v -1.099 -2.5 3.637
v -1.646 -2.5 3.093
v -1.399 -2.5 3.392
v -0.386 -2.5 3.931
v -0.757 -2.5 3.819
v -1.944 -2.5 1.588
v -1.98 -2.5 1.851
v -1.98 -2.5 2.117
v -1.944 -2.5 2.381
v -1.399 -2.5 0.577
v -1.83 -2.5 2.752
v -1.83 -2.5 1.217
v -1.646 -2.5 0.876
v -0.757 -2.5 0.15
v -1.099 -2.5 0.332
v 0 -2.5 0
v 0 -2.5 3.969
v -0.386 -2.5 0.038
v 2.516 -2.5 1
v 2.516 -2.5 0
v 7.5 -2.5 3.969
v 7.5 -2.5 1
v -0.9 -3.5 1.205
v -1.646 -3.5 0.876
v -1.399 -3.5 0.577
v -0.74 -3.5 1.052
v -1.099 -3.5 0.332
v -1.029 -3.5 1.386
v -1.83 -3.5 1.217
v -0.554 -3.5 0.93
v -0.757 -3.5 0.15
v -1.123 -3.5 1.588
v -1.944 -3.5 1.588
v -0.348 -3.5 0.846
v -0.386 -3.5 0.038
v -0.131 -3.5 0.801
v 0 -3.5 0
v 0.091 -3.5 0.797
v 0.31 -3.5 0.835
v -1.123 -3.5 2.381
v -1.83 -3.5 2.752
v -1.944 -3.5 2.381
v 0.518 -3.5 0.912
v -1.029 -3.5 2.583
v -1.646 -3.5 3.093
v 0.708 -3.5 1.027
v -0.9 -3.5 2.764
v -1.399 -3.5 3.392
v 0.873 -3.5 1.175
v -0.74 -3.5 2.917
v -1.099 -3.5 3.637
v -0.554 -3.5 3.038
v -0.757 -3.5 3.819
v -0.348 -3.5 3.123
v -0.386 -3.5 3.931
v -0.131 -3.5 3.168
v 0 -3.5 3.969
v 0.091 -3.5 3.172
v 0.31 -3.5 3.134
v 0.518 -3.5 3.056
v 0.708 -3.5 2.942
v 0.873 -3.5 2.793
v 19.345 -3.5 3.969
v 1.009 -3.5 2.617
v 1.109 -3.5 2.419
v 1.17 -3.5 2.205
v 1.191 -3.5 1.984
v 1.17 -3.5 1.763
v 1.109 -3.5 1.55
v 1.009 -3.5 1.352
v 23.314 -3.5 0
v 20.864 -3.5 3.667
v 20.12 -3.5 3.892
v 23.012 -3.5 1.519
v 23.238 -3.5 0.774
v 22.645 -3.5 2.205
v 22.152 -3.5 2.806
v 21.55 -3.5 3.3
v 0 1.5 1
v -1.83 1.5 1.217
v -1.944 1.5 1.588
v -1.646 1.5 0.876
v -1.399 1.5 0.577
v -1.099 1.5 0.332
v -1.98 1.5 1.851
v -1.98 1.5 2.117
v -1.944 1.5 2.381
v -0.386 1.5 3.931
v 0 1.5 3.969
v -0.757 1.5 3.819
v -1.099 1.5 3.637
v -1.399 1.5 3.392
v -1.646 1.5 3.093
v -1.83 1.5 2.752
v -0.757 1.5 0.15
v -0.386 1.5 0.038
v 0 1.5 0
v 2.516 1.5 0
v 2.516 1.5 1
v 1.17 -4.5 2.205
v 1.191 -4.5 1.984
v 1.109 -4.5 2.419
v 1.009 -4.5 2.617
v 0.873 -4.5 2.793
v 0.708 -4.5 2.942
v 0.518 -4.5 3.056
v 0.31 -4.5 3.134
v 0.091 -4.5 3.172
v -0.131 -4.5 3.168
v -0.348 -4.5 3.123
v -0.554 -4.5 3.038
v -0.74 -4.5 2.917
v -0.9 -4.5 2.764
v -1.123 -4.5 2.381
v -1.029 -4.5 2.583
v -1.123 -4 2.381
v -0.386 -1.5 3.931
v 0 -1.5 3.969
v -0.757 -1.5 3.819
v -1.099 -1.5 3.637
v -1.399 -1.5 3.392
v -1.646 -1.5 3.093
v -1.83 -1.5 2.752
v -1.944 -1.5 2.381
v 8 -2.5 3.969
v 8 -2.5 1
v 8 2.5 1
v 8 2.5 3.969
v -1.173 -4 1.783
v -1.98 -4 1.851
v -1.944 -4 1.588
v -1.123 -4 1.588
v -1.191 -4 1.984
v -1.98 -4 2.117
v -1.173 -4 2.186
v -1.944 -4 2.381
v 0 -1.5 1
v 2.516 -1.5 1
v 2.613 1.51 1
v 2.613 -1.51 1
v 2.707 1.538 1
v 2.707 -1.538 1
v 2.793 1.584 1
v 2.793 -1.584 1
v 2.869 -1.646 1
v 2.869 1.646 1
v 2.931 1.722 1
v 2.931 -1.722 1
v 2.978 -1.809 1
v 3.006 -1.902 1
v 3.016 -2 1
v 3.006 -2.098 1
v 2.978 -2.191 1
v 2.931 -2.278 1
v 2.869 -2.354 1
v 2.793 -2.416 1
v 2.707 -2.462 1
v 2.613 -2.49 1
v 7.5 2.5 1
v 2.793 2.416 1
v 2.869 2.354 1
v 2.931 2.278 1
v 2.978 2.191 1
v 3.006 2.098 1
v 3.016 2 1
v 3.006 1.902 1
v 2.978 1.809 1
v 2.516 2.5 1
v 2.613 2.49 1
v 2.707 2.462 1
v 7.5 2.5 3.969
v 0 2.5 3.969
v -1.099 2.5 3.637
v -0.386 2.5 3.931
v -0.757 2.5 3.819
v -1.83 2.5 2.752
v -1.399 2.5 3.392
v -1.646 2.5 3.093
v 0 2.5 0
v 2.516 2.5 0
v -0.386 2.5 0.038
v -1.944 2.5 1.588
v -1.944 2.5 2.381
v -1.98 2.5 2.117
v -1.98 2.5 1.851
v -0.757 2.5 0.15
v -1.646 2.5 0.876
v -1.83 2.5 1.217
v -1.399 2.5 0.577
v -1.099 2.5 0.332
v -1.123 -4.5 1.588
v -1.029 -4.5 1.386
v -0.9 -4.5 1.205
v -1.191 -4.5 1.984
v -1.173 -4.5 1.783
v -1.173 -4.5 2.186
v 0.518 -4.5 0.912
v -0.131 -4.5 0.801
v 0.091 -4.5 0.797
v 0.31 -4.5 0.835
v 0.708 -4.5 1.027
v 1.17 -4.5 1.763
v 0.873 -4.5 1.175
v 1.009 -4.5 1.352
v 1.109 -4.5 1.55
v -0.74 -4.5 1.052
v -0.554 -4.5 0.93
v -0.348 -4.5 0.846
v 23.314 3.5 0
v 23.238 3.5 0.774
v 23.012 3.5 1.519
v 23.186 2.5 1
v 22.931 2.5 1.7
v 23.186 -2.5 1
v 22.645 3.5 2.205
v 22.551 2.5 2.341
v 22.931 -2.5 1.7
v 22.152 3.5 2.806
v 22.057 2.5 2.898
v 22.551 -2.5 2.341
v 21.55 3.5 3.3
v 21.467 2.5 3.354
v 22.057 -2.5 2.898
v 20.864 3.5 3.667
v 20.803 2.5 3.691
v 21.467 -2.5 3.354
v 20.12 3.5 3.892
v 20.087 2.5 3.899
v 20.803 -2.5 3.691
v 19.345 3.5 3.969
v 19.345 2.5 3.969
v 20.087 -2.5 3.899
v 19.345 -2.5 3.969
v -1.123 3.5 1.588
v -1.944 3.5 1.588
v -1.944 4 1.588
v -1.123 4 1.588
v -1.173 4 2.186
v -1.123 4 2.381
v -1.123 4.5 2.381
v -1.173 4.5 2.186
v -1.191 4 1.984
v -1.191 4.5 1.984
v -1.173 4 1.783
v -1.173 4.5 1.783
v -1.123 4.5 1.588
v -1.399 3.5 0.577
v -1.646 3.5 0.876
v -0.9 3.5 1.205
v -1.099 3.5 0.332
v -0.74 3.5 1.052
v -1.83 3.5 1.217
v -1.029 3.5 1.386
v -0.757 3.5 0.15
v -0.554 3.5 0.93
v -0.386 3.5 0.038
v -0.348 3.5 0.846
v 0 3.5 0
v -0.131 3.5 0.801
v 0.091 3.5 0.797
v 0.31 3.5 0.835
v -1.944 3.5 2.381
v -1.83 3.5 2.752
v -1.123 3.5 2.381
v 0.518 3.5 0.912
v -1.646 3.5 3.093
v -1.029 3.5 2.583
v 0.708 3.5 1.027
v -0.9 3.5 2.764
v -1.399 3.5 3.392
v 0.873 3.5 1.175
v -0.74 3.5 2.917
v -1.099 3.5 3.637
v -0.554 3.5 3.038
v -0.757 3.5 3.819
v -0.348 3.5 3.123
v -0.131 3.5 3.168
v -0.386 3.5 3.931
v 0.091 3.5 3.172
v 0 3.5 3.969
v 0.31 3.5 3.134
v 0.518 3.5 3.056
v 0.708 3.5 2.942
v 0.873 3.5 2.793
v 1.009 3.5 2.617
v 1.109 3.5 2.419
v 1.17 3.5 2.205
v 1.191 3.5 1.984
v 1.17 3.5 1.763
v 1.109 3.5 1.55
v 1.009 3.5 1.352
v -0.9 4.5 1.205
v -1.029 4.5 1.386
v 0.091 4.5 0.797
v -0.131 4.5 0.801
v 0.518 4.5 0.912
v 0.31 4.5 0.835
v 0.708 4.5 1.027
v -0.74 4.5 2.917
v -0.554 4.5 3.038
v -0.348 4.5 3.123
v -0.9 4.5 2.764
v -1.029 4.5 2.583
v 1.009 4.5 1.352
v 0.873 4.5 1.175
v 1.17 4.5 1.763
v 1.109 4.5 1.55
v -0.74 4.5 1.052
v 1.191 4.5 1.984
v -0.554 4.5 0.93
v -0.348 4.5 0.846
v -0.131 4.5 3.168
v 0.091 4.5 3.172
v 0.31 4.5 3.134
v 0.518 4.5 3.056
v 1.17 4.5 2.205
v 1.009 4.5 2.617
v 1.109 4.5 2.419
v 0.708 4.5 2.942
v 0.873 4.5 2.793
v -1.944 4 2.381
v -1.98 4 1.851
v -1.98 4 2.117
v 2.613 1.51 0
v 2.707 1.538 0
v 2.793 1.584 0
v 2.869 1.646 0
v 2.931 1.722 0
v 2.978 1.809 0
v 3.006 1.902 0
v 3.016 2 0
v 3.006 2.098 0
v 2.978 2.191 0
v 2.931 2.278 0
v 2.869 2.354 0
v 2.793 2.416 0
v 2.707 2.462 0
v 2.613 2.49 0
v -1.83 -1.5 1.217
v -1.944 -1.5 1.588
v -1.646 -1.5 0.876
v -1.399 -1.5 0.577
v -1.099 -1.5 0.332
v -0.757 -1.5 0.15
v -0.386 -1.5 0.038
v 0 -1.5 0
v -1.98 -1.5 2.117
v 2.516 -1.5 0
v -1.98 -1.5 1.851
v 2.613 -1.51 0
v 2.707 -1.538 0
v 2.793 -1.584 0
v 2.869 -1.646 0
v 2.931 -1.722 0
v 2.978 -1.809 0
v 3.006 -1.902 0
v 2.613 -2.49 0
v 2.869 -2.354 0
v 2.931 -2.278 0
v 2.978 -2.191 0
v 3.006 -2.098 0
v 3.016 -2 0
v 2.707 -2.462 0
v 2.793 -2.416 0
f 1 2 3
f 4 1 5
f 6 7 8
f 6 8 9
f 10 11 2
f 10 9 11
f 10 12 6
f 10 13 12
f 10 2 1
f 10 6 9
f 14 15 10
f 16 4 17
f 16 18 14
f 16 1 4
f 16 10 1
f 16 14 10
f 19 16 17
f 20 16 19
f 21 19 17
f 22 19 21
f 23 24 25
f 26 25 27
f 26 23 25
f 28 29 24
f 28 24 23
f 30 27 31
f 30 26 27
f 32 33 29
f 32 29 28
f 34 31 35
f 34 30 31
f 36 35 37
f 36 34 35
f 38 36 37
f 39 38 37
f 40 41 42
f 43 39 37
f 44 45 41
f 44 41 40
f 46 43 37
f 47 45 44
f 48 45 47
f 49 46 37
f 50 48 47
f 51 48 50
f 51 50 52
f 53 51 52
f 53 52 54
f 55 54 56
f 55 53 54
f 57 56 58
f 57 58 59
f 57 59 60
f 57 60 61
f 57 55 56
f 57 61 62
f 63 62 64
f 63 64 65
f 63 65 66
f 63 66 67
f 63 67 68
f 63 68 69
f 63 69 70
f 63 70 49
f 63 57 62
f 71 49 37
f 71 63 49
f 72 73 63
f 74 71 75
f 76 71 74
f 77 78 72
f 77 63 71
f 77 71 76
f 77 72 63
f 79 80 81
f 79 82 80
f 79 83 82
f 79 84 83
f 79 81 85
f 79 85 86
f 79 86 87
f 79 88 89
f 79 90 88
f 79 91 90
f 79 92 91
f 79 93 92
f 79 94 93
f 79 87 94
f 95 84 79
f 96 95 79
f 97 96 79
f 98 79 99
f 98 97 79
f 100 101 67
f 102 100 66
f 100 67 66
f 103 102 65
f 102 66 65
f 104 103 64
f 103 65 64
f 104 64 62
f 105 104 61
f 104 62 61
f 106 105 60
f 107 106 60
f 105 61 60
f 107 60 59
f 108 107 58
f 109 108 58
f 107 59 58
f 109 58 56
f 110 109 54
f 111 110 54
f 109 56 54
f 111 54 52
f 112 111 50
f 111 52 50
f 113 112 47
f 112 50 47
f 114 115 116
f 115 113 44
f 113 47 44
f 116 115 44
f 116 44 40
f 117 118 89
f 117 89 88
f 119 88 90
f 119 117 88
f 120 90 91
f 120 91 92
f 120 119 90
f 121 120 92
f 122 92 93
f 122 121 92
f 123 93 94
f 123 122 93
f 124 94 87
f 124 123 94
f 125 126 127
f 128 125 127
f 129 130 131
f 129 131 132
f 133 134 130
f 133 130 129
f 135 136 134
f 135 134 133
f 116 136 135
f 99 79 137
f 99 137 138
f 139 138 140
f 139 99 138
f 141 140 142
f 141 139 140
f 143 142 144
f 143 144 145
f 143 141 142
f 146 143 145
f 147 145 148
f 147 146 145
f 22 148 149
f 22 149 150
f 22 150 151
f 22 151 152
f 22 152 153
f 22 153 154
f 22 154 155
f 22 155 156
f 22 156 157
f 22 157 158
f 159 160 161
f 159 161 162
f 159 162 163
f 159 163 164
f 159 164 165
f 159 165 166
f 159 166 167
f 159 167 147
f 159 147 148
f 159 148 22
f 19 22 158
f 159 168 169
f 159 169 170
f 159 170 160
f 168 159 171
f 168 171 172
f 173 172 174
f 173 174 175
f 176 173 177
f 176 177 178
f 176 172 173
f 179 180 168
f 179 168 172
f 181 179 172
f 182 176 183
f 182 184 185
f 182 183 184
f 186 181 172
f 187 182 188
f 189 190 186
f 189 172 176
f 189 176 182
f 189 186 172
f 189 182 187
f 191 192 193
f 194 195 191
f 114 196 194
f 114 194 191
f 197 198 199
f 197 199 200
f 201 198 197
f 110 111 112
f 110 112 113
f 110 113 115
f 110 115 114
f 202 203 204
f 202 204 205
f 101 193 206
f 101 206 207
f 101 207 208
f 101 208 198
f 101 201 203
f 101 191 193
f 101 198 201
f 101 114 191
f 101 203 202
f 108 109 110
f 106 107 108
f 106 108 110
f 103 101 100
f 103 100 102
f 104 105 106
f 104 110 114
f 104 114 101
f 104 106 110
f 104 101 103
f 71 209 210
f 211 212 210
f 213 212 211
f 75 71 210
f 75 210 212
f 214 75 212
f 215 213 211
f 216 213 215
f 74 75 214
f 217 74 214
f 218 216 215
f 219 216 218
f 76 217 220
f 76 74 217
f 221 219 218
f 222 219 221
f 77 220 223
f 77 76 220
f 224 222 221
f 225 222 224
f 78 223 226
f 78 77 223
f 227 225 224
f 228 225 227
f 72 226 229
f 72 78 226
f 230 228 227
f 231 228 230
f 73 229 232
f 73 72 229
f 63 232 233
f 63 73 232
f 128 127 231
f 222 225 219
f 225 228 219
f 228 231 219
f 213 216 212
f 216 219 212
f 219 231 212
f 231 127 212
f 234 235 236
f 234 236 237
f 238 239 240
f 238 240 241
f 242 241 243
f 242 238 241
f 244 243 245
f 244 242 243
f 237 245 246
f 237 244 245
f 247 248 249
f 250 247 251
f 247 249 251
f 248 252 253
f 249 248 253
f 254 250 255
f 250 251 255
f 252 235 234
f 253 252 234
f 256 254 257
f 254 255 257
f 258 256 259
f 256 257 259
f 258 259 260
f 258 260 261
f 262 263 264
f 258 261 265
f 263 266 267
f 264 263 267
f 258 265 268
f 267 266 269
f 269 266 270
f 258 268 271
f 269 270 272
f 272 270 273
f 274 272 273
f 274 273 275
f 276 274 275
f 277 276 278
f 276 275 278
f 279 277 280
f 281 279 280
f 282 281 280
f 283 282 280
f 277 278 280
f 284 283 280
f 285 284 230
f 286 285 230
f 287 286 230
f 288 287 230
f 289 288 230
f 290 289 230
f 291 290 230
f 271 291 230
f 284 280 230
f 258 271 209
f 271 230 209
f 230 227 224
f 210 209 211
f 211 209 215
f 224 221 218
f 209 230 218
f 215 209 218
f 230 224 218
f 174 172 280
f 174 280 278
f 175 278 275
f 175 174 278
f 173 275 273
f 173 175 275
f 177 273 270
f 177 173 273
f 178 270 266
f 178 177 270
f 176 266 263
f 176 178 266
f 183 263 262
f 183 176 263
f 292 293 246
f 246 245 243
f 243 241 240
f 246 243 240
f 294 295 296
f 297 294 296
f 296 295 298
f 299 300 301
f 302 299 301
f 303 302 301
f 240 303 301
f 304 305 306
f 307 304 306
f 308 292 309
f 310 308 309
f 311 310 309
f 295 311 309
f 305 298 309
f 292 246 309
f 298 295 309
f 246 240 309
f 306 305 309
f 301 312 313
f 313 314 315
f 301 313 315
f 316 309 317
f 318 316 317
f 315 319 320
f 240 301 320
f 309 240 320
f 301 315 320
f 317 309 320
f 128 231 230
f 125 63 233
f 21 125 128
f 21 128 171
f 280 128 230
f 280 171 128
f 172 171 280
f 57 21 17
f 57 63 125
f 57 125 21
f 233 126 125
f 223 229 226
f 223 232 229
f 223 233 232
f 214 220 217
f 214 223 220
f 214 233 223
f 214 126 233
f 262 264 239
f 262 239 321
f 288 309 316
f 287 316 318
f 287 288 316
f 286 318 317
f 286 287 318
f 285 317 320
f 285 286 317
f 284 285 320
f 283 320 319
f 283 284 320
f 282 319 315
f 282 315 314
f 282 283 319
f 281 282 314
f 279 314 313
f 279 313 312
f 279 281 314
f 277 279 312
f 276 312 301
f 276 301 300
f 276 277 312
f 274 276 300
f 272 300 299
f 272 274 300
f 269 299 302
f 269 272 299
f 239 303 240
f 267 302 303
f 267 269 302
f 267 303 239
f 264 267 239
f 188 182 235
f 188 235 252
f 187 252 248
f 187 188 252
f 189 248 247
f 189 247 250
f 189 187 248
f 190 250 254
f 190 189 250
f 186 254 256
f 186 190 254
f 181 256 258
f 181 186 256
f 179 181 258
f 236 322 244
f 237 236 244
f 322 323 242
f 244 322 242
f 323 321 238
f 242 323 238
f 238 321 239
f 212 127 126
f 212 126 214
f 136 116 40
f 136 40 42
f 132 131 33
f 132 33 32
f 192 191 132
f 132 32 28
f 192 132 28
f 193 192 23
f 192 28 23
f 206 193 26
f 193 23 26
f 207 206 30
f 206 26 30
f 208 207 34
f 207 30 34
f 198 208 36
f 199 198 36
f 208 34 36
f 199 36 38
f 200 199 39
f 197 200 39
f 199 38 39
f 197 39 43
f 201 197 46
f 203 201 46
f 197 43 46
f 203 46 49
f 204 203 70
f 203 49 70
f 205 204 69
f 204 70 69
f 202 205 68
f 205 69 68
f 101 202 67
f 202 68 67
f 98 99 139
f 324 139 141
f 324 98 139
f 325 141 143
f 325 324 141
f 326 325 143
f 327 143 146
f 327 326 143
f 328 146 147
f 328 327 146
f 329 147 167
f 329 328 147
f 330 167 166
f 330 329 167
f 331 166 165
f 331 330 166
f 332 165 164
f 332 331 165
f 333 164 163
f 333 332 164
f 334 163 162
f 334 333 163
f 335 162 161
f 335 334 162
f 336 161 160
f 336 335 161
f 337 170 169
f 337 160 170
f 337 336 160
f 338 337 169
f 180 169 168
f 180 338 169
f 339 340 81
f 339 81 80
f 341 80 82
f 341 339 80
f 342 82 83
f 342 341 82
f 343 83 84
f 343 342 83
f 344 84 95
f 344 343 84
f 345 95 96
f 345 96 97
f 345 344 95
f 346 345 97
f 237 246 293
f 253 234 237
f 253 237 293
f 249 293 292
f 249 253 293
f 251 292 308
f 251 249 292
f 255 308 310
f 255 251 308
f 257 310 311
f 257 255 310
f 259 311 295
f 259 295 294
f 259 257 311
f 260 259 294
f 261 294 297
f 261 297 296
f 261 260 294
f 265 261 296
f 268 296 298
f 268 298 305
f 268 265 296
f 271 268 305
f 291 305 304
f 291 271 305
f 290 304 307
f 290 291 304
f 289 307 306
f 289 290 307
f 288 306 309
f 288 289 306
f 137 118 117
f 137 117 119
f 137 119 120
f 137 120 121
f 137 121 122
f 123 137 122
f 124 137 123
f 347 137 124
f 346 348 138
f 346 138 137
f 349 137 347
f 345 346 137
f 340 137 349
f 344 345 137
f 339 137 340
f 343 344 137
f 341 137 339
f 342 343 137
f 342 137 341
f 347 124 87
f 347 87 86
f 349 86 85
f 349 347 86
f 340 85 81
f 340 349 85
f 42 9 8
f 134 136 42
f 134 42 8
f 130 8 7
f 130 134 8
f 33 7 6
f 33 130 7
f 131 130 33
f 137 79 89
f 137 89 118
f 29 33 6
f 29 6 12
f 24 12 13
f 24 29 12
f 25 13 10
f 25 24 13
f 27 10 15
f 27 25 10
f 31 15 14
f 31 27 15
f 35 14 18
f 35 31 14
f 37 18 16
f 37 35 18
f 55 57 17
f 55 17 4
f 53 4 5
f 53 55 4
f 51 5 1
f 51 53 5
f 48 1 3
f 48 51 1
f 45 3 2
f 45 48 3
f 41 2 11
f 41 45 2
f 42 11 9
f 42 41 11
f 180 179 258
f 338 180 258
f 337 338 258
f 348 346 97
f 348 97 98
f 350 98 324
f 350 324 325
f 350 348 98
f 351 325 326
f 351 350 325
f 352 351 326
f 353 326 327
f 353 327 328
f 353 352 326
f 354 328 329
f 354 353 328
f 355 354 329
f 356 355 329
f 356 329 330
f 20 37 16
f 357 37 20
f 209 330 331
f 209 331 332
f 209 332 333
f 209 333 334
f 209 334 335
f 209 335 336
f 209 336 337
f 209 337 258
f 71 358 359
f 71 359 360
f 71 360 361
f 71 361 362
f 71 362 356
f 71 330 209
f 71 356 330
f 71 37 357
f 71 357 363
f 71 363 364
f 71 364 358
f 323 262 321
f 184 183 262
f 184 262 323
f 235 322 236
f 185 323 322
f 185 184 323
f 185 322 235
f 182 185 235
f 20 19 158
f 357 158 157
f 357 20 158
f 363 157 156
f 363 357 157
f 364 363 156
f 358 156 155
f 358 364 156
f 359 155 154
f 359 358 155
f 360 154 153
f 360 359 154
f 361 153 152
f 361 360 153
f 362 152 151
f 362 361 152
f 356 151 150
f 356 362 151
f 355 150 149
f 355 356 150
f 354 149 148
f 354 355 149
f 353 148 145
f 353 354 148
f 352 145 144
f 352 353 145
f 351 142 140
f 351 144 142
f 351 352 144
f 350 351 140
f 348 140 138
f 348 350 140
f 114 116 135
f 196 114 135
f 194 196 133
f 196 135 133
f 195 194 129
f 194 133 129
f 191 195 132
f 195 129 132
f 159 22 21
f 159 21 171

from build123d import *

# Parameters (mm, degrees)
F1_DEPTH = 3.5
F2_DEPTH = 4.5
F3_DEPTH = 4
F4_W     = 1.984375
F4_H     = 1
F5_DEPTH = 25
F6_START = 1
F4_W_2   = 15.314116451
F4_H_2   = 5
F6_DEPTH = 2.96975


with BuildPart() as f1:
    # F0 (on Front) → F1 (new body, symmetric)
    with BuildSketch(Plane.XZ):
        with BuildLine():
            ThreePointArc((1.984375, 1.984375), (1.4031650189, 0.5812099811), (0, 0))
            Line((0, 0), (23.314116451, 0))
            ThreePointArc((23.314116451, 0), (22.1516964889, 2.8063300378), (19.345366451, 3.96875))
            Line((19.345366451, 3.96875), (0, 3.96875))
            ThreePointArc((0, 3.96875), (1.4031650189, 3.3875400189), (1.984375, 1.984375))
        make_face()
        with BuildLine():
            ThreePointArc((-1.9442824833, 1.5875), (-1.2550289464, 0.4472847345), (0, 0))
            ThreePointArc((0, 0), (1.4031650189, 0.5812099811), (1.984375, 1.984375))
            ThreePointArc((1.984375, 1.984375), (1.4031650189, 3.3875400189), (0, 3.96875))
            ThreePointArc((0, 3.96875), (-1.2550289464, 3.5214652655), (-1.9442824833, 2.38125))
            Line((-1.9442824833, 2.38125), (-1.1225320151, 2.38125))
            ThreePointArc((-1.1225320151, 2.38125), (0.2013370434, 3.1578532851), (1.190625, 1.984375))
            ThreePointArc((1.190625, 1.984375), (0.2013370434, 0.8108967149), (-1.1225320151, 1.5875))
            Line((-1.1225320151, 1.5875), (-1.9442824833, 1.5875))
        make_face()
        with BuildLine():
            ThreePointArc((-1.9442824833, 2.38125), (-1.984375, 1.984375), (-1.9442824833, 1.5875))
            Line((-1.9442824833, 1.5875), (-1.1225320151, 1.5875))
            ThreePointArc((-1.1225320151, 1.5875), (-1.190625, 1.984375), (-1.1225320151, 2.38125))
            Line((-1.1225320151, 2.38125), (-1.9442824833, 2.38125))
        make_face()
    extrude(amount=F1_DEPTH, both=True)

    # F0 (on Front) → F2 (join, symmetric)
    with BuildSketch(Plane.XZ):
        with BuildLine():
            ThreePointArc((-1.1225320151, 2.38125), (-1.190625, 1.984375), (-1.1225320151, 1.5875))
            ThreePointArc((-1.1225320151, 1.5875), (0.2013370434, 0.8108967149), (1.190625, 1.984375))
            ThreePointArc((1.190625, 1.984375), (0.2013370434, 3.1578532851), (-1.1225320151, 2.38125))
        make_face()
    extrude(amount=F2_DEPTH, both=True)

    # F0 (on Front) → F3 (join, symmetric)
    with BuildSketch(Plane.XZ):
        with BuildLine():
            ThreePointArc((-1.9442824833, 2.38125), (-1.984375, 1.984375), (-1.9442824833, 1.5875))
            Line((-1.9442824833, 1.5875), (-1.1225320151, 1.5875))
            ThreePointArc((-1.1225320151, 1.5875), (-1.190625, 1.984375), (-1.1225320151, 2.38125))
            Line((-1.1225320151, 2.38125), (-1.9442824833, 2.38125))
        make_face()
    extrude(amount=F3_DEPTH, both=True)

    # F4 (on Top) → F5 (cut)
    with BuildSketch(Plane.XY):
        with Locations((-0.9921875, 2)):
            Rectangle(F4_W, F4_H)
        with BuildLine():
            Line((0, 2.5), (0, 1.5))
            Line((0, 1.5), (2.515625, 1.5))
            ThreePointArc((2.515625, 1.5), (3.015625, 2), (2.515625, 2.5))
            Line((2.515625, 2.5), (0, 2.5))
        make_face()
        with Locations((-0.9921875, -2)):
            Rectangle(F4_W, F4_H)
        with BuildLine():
            Line((0, -1.5), (0, -2.5))
            Line((0, -2.5), (2.515625, -2.5))
            ThreePointArc((2.515625, -2.5), (3.015625, -2), (2.515625, -1.5))
            Line((2.515625, -1.5), (0, -1.5))
        make_face()
    extrude(amount=F5_DEPTH, mode=Mode.SUBTRACT)

    # F4 (on Top) → F6 (cut)
    with BuildSketch(Plane.XY.offset(F6_START)):
        with BuildLine():
            ThreePointArc((2.515625, -1.5), (3.015625, -2), (2.515625, -2.5))
            Line((2.515625, -2.5), (7.5, -2.5))
            Line((7.5, -2.5), (7.5, 2.5))
            Line((7.5, 2.5), (2.515625, 2.5))
            ThreePointArc((2.515625, 2.5), (3.015625, 2), (2.515625, 1.5))
            Line((2.515625, 1.5), (0, 1.5))
            Line((0, 1.5), (0, -1.5))
            Line((0, -1.5), (2.515625, -1.5))
        make_face()
        with Locations((15.6570582255, 0)):
            Rectangle(F4_W_2, F4_H_2)
    extrude(amount=F6_DEPTH, mode=Mode.SUBTRACT)


solid = f1.part
